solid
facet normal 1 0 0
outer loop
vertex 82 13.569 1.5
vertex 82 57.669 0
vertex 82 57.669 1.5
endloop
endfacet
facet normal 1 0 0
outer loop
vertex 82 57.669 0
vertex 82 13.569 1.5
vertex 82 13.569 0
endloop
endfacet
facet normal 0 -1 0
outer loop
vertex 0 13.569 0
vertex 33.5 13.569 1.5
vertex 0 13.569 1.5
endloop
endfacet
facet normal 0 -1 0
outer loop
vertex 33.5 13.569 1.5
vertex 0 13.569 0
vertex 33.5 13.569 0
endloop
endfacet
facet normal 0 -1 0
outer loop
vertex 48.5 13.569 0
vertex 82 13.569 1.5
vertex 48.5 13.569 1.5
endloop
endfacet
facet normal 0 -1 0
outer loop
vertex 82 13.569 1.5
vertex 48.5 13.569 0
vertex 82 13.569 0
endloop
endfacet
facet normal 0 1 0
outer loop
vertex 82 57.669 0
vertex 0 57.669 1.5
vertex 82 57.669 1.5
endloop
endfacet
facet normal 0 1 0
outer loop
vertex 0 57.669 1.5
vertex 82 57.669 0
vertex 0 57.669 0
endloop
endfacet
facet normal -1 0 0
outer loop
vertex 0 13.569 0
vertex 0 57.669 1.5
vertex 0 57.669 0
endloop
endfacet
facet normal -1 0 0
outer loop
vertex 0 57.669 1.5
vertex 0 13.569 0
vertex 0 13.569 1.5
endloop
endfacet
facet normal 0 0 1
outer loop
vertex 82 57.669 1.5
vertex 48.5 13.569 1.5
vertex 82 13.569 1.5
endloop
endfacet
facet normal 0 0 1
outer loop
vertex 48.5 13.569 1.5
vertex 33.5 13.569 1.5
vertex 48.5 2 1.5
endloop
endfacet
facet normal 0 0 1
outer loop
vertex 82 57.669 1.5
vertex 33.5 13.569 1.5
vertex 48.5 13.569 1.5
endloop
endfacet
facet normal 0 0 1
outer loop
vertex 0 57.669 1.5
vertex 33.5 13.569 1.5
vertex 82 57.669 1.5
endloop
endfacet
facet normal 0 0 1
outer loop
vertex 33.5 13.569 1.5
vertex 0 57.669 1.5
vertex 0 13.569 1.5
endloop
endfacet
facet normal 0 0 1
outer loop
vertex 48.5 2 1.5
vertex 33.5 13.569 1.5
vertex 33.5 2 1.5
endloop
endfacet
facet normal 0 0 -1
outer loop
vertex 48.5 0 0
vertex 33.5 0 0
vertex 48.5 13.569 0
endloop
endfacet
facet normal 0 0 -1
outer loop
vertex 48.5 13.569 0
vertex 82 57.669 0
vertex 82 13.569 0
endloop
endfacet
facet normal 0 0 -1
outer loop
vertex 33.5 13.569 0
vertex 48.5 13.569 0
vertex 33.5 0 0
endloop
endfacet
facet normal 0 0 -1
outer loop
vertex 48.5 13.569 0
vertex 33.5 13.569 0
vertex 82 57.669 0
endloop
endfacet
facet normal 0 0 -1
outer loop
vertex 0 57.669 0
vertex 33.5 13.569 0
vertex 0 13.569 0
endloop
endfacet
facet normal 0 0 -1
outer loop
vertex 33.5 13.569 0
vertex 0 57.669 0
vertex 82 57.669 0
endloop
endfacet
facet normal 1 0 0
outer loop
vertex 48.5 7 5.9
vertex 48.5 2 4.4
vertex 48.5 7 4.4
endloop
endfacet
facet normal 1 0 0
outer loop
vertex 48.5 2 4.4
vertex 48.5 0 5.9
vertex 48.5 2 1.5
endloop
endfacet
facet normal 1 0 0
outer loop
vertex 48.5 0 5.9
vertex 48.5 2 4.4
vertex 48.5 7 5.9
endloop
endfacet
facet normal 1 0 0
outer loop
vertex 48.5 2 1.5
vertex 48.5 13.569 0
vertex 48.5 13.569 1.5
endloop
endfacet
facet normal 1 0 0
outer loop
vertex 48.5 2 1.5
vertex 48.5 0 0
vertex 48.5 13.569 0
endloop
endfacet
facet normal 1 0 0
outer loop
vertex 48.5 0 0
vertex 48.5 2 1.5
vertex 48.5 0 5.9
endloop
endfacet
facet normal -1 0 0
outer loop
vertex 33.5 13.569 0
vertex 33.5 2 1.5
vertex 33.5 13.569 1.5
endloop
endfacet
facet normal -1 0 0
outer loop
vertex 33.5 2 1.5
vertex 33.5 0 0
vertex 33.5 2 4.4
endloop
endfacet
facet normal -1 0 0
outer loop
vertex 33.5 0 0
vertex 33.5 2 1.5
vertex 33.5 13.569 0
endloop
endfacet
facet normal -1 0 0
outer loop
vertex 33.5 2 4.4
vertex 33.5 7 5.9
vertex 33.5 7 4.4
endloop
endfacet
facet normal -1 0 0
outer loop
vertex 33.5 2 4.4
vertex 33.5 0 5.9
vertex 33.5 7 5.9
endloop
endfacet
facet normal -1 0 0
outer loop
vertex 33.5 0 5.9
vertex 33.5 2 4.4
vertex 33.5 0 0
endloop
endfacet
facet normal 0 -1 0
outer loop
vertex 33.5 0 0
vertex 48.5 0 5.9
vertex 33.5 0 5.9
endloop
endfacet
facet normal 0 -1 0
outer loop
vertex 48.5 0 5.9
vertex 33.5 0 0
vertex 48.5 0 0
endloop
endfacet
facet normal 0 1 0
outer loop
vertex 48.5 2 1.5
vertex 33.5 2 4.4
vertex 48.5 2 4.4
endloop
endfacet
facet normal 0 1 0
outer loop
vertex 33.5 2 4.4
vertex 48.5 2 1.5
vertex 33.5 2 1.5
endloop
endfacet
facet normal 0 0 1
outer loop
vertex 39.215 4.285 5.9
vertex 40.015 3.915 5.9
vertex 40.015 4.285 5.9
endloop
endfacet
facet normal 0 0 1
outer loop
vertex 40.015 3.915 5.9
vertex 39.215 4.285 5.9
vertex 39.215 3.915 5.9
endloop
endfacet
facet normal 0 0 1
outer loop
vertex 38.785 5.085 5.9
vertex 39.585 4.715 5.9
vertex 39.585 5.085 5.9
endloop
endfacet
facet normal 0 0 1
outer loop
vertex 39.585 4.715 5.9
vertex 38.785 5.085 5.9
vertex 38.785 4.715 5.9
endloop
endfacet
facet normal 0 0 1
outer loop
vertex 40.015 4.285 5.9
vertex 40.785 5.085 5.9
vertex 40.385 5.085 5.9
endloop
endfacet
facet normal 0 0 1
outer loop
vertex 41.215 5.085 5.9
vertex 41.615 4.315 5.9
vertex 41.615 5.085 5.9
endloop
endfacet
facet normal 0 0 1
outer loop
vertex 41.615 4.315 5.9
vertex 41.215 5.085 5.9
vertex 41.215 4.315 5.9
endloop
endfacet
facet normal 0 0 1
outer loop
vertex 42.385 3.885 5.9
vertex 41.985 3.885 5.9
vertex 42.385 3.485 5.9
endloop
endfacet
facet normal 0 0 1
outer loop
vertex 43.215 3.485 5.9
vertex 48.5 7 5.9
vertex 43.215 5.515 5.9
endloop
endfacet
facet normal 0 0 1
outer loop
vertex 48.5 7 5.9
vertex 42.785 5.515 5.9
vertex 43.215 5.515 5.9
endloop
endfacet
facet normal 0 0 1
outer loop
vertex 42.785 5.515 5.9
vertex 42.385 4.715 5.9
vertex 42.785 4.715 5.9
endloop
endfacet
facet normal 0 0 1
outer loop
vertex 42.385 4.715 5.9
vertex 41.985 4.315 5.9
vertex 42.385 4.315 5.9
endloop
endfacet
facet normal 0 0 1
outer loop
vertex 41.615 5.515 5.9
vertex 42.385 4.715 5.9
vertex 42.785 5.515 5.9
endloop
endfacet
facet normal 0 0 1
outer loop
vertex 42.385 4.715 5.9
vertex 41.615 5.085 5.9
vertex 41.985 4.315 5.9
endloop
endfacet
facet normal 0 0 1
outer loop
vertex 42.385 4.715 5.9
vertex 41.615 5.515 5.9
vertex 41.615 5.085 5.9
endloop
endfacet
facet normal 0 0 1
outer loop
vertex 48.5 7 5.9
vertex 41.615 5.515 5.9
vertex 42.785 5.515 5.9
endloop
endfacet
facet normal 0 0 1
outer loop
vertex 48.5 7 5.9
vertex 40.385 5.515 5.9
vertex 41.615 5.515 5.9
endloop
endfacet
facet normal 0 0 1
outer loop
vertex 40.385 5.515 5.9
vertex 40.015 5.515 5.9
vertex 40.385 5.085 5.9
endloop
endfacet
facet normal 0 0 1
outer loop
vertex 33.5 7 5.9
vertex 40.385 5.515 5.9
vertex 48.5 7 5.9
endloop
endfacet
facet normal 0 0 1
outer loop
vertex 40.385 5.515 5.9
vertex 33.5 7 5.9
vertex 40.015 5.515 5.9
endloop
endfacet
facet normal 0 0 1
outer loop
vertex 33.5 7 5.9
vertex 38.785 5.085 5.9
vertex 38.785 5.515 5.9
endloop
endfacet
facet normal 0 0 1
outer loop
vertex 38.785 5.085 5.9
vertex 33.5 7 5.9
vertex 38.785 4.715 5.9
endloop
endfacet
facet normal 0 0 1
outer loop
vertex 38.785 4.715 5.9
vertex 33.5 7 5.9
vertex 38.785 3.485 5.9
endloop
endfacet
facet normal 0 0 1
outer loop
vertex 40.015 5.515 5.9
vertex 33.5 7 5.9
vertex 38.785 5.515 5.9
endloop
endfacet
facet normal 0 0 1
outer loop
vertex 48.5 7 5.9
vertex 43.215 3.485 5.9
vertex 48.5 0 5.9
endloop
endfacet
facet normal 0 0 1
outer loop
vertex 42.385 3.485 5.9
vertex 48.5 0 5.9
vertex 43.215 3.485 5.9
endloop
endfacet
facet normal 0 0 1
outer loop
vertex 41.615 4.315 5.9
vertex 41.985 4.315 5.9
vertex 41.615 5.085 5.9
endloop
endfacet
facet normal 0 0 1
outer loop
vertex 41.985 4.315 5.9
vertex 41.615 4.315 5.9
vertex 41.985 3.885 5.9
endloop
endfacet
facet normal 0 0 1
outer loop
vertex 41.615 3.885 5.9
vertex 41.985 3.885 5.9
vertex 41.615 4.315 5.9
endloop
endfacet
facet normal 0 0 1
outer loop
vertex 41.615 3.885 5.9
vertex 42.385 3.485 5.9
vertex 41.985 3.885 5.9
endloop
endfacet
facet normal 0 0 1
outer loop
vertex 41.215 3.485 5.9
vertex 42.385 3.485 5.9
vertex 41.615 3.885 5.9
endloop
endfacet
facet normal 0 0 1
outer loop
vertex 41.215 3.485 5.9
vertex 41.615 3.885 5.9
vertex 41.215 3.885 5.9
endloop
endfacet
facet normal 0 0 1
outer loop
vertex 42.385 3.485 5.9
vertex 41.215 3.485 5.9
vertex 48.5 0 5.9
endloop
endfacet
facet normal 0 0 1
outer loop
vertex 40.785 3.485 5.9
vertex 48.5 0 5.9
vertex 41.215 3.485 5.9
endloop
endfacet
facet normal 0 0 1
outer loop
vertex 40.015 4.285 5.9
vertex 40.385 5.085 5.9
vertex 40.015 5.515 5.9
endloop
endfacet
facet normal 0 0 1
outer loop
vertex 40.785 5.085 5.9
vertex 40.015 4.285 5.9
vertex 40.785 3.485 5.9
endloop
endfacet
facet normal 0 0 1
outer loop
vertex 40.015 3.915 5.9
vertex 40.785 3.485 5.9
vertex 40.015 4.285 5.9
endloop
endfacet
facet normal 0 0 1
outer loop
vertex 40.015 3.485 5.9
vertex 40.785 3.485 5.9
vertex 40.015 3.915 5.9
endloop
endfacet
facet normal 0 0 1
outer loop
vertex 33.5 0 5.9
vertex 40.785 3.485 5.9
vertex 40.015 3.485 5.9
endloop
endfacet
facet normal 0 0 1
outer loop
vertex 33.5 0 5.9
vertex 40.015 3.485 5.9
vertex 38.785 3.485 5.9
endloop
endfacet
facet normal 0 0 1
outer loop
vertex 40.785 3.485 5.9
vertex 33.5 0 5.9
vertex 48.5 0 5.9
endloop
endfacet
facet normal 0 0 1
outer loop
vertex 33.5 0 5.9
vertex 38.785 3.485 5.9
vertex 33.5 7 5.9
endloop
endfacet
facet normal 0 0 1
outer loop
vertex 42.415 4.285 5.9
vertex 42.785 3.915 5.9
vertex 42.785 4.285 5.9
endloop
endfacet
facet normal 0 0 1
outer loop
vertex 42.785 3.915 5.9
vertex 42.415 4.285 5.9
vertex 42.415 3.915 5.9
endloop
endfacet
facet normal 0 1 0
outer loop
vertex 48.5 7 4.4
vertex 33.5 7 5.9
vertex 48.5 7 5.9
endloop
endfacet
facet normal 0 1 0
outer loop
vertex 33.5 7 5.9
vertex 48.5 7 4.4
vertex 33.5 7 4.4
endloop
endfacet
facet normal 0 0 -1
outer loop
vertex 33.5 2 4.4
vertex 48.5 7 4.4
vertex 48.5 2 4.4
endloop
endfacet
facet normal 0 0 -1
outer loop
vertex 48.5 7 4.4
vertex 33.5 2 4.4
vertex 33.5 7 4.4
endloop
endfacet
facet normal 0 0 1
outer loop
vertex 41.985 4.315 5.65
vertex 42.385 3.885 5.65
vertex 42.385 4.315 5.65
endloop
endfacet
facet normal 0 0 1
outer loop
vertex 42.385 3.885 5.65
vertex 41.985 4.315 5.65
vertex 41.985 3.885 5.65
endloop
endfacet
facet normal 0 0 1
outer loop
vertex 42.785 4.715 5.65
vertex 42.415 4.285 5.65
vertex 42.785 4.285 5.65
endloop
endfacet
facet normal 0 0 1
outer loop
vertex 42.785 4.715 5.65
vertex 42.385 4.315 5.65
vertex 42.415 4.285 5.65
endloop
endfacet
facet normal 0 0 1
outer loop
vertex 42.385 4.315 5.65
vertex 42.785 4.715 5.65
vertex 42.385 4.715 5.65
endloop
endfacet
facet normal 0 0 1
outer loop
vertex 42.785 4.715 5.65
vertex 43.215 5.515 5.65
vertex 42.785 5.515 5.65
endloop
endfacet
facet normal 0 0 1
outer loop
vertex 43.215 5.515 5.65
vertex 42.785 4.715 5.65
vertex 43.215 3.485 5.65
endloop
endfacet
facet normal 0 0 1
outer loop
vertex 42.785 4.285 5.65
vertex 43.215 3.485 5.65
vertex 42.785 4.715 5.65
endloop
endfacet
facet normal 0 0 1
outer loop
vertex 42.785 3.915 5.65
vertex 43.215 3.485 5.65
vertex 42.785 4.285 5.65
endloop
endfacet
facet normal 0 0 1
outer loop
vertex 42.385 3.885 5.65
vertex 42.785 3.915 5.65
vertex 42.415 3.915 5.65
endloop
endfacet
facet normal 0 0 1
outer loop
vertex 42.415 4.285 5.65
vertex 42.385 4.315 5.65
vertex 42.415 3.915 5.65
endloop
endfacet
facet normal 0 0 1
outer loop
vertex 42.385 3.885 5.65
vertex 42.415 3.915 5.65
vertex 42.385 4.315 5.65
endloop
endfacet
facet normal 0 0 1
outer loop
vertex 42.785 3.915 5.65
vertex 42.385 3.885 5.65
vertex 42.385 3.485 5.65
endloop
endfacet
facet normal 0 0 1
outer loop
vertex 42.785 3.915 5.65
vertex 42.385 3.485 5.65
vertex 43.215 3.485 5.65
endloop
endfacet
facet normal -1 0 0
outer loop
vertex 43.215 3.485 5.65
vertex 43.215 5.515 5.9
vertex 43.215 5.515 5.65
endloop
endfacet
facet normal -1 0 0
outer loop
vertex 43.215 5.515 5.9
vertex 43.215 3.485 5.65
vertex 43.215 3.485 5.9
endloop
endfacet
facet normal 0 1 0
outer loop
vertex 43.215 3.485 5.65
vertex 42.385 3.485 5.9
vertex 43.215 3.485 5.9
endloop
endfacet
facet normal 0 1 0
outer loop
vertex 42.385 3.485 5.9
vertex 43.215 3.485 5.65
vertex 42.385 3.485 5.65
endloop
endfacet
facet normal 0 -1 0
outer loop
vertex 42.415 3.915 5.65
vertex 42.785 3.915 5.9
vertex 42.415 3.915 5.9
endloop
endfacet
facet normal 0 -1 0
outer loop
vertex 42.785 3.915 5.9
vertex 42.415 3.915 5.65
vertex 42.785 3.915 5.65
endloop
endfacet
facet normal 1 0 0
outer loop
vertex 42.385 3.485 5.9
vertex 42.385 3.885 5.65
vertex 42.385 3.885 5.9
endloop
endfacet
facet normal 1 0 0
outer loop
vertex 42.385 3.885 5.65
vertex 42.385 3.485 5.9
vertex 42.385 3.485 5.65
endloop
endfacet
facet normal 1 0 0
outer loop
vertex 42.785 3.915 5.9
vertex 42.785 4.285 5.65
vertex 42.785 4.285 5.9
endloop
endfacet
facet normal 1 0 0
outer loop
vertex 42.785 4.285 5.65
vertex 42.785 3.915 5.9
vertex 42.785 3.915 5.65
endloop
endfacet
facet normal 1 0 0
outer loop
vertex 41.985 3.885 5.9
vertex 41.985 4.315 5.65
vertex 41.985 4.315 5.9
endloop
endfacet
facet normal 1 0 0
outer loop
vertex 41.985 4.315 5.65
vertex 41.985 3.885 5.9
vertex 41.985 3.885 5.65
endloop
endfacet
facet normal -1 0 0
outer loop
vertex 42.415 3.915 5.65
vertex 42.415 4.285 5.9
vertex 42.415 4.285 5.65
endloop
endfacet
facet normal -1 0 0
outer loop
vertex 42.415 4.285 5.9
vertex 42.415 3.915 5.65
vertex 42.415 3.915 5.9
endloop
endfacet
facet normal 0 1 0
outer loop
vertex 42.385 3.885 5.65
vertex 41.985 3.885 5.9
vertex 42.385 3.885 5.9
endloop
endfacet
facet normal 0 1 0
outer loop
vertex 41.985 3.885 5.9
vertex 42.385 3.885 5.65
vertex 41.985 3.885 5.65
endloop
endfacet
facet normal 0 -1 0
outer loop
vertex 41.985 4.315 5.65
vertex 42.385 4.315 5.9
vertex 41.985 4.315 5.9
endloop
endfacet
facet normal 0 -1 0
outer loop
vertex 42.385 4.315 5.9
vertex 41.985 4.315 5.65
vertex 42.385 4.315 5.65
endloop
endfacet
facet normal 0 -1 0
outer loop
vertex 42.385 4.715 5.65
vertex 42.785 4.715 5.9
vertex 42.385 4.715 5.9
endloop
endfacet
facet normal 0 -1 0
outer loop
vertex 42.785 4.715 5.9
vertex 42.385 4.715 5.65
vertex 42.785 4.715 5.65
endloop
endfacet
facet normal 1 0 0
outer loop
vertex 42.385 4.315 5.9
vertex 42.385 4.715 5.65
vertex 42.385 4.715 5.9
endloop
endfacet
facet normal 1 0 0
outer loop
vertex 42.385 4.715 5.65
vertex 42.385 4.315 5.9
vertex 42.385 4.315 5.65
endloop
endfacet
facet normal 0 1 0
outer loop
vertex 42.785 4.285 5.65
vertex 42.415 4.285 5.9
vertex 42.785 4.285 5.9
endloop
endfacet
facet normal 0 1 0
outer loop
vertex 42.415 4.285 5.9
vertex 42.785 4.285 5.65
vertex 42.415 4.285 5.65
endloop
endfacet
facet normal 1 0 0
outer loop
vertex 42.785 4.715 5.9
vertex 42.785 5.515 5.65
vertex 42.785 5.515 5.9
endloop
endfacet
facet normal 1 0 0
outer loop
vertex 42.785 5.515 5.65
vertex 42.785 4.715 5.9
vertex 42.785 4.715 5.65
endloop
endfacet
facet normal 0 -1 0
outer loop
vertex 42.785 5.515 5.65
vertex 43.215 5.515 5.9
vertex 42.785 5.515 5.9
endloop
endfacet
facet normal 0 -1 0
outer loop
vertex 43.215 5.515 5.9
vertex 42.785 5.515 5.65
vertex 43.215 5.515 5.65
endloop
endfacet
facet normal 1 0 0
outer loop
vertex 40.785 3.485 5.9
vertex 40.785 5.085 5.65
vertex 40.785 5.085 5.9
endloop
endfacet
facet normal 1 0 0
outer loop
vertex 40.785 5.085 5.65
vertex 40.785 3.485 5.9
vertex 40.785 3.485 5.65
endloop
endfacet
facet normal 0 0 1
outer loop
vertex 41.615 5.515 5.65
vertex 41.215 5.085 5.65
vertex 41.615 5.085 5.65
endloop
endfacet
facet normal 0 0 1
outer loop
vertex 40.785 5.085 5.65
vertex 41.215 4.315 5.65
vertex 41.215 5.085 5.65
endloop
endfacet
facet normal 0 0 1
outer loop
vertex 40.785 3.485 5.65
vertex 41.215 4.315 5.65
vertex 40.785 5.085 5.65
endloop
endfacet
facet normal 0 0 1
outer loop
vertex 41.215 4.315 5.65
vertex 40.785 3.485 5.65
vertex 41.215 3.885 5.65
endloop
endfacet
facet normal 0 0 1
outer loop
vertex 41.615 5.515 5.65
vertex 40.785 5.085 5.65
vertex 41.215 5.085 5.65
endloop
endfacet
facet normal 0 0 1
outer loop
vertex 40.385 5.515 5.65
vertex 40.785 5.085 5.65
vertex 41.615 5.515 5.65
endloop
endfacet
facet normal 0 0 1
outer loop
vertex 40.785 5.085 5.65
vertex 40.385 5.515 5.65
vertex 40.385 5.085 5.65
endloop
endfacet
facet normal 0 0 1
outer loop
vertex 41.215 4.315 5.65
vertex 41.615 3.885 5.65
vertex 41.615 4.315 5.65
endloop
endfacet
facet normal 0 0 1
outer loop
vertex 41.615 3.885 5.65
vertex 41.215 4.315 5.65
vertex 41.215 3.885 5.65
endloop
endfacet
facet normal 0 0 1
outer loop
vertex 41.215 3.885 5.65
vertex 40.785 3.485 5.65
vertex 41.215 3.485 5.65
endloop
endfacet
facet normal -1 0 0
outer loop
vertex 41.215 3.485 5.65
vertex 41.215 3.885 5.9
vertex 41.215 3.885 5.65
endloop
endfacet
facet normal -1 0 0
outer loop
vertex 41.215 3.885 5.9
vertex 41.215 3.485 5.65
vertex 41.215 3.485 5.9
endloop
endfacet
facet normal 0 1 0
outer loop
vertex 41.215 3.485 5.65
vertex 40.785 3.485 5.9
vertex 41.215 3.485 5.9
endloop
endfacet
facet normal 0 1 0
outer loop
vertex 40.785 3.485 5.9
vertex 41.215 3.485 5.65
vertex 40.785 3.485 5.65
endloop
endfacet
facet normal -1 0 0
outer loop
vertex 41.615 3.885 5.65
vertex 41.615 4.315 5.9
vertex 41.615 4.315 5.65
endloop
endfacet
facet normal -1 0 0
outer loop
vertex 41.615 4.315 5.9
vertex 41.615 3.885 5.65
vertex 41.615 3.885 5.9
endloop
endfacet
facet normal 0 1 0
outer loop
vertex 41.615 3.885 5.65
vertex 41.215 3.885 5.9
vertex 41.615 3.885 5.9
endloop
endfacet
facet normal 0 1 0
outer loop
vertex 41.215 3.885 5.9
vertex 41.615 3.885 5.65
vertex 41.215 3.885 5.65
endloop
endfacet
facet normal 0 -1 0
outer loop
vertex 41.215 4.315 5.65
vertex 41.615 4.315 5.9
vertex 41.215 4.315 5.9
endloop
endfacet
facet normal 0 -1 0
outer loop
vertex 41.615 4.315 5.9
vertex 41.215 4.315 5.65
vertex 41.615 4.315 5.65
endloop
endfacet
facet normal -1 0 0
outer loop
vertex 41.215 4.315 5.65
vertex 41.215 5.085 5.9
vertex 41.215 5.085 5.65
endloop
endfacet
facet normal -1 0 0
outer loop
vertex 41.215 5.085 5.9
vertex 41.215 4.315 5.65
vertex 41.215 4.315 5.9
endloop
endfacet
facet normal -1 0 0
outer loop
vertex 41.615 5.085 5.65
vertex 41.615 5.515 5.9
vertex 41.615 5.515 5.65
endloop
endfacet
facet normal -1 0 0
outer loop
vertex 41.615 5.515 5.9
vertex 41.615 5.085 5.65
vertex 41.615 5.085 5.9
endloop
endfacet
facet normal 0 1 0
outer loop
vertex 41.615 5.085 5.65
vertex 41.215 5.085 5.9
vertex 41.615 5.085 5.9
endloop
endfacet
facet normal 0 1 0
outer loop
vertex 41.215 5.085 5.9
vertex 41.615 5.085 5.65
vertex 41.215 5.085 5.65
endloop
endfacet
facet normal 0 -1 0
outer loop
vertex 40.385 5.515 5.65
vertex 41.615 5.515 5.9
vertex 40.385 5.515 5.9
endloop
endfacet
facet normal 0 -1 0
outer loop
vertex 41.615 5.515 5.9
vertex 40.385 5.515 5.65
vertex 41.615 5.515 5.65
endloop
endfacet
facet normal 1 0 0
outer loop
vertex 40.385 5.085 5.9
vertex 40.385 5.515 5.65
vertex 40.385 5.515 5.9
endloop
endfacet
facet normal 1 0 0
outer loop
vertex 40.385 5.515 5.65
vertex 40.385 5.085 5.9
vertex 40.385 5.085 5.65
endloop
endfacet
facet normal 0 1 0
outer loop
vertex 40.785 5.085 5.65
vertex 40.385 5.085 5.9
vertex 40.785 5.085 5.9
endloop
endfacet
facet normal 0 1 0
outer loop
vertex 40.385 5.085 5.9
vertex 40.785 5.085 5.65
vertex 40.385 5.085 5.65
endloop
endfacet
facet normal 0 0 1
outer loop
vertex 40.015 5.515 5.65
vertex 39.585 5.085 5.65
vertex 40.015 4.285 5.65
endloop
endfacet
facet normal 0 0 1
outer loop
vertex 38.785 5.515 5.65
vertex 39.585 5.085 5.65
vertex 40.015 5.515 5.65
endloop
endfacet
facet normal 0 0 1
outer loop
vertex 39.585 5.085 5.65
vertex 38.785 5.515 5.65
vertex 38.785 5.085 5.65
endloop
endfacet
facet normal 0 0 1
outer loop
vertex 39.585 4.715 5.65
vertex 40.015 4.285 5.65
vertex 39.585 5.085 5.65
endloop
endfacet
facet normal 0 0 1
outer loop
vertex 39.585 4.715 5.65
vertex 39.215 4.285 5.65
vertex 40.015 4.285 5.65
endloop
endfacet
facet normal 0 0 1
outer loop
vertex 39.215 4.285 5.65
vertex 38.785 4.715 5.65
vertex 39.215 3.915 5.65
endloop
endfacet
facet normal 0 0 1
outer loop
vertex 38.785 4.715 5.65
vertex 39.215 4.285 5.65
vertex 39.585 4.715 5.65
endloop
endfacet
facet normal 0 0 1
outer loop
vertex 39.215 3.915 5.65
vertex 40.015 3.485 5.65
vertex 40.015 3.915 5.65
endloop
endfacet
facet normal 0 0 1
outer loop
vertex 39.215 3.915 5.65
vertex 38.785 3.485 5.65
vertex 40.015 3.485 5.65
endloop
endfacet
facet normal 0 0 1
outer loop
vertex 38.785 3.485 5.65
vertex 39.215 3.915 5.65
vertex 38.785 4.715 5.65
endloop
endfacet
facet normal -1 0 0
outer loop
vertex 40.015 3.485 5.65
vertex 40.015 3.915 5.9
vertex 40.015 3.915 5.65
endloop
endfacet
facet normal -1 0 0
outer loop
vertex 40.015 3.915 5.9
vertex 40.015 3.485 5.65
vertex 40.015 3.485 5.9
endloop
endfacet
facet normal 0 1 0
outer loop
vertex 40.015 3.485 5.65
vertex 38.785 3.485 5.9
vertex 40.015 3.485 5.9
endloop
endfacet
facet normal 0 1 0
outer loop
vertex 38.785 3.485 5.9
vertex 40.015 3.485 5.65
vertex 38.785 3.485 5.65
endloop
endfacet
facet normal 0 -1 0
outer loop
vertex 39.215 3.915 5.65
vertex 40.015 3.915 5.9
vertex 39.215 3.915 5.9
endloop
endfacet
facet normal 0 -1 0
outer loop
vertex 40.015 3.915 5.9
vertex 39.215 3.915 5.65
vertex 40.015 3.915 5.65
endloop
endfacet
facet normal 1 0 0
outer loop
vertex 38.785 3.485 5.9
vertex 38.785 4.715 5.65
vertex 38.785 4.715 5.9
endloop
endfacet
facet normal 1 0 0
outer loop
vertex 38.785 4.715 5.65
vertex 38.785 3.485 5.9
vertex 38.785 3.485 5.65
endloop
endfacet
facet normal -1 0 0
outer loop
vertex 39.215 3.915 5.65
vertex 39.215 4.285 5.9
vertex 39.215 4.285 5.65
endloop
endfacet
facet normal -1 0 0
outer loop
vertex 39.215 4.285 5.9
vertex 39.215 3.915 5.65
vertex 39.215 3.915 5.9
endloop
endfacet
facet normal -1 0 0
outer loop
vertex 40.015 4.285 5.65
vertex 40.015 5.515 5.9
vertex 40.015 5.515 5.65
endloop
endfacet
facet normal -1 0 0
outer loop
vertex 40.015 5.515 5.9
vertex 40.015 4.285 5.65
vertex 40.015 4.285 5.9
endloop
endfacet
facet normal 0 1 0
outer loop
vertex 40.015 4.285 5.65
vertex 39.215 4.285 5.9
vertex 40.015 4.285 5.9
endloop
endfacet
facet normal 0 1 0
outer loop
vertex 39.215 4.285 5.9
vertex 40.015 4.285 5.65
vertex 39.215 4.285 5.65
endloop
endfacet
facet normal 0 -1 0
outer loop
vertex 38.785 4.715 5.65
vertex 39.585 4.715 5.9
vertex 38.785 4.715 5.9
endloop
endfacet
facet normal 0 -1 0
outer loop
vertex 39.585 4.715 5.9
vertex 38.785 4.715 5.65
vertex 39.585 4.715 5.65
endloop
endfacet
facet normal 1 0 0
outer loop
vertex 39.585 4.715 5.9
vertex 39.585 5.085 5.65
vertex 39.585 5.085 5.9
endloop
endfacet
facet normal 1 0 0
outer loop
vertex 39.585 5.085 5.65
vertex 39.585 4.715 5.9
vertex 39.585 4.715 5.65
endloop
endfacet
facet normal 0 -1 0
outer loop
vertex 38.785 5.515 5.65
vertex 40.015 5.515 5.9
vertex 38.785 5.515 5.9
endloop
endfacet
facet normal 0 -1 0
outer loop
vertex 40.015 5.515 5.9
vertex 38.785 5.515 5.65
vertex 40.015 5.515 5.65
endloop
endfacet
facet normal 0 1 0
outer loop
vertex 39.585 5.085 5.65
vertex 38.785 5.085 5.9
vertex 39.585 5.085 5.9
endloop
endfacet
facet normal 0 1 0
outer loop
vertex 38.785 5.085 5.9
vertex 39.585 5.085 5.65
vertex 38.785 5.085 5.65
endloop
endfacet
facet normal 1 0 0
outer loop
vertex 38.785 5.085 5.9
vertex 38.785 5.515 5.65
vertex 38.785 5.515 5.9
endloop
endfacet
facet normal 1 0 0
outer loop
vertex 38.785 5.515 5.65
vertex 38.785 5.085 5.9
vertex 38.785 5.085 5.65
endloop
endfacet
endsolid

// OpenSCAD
// 57mm中央掛鉤窄牌側墊
$fn=64;
translate([45,121.66917,-29]){rotate([90,0,0]){difference(){union(){union(){union(){translate([-45,29,64]){cube([82,1.5,44.1]);}translate([-11.5,29,64]){cube([15,1.5,55.76917]);}}translate([-11.5,29,119.66917]){cube([15,5.9,2]);}}translate([-11.5,33.4,114.66917]){cube([15,1.5,7]);}}multmatrix([[-1,0,0,-4],[0,0,1,34.9],[0,1,0,117.16917],[0,0,0,1]]){union(){union(){union(){union(){union(){union(){union(){union(){union(){union(){union(){union(){union(){union(){union(){union(){union(){union(){union(){union(){union(){union(){union(){union(){union(){union(){translate([-2.215,0.585,-0.25]){cube([0.43,0.43,0.37]);}translate([-1.815,0.585,-0.25]){cube([0.43,0.43,0.37]);}}translate([-2.215,0.185,-0.25]){cube([0.43,0.43,0.37]);}}translate([-1.415,0.185,-0.25]){cube([0.43,0.43,0.37]);}}translate([-2.215,-0.215,-0.25]){cube([0.43,0.43,0.37]);}}translate([-1.815,-0.215,-0.25]){cube([0.43,0.43,0.37]);}}translate([-2.215,-0.615,-0.25]){cube([0.43,0.43,0.37]);}}translate([-2.215,-1.015,-0.25]){cube([0.43,0.43,0.37]);}}translate([-0.215,0.585,-0.25]){cube([0.43,0.43,0.37]);}}translate([-0.615,0.185,-0.25]){cube([0.43,0.43,0.37]);}}translate([-0.215,0.185,-0.25]){cube([0.43,0.43,0.37]);}}translate([-0.215,-0.215,-0.25]){cube([0.43,0.43,0.37]);}}translate([-0.215,-0.615,-0.25]){cube([0.43,0.43,0.37]);}}translate([-0.615,-1.015,-0.25]){cube([0.43,0.43,0.37]);}}translate([-0.215,-1.015,-0.25]){cube([0.43,0.43,0.37]);}}translate([0.185,-1.015,-0.25]){cube([0.43,0.43,0.37]);}}translate([0.985,0.585,-0.25]){cube([0.43,0.43,0.37]);}}translate([1.385,0.585,-0.25]){cube([0.43,0.43,0.37]);}}translate([1.785,0.585,-0.25]){cube([0.43,0.43,0.37]);}}translate([1.785,0.185,-0.25]){cube([0.43,0.43,0.37]);}}translate([0.985,-0.215,-0.25]){cube([0.43,0.43,0.37]);}}translate([1.385,-0.215,-0.25]){cube([0.43,0.43,0.37]);}}translate([1.785,-0.215,-0.25]){cube([0.43,0.43,0.37]);}}translate([0.985,-0.615,-0.25]){cube([0.43,0.43,0.37]);}}translate([0.985,-1.015,-0.25]){cube([0.43,0.43,0.37]);}}translate([1.385,-1.015,-0.25]){cube([0.43,0.43,0.37]);}}translate([1.785,-1.015,-0.25]){cube([0.43,0.43,0.37]);}}}}}}
